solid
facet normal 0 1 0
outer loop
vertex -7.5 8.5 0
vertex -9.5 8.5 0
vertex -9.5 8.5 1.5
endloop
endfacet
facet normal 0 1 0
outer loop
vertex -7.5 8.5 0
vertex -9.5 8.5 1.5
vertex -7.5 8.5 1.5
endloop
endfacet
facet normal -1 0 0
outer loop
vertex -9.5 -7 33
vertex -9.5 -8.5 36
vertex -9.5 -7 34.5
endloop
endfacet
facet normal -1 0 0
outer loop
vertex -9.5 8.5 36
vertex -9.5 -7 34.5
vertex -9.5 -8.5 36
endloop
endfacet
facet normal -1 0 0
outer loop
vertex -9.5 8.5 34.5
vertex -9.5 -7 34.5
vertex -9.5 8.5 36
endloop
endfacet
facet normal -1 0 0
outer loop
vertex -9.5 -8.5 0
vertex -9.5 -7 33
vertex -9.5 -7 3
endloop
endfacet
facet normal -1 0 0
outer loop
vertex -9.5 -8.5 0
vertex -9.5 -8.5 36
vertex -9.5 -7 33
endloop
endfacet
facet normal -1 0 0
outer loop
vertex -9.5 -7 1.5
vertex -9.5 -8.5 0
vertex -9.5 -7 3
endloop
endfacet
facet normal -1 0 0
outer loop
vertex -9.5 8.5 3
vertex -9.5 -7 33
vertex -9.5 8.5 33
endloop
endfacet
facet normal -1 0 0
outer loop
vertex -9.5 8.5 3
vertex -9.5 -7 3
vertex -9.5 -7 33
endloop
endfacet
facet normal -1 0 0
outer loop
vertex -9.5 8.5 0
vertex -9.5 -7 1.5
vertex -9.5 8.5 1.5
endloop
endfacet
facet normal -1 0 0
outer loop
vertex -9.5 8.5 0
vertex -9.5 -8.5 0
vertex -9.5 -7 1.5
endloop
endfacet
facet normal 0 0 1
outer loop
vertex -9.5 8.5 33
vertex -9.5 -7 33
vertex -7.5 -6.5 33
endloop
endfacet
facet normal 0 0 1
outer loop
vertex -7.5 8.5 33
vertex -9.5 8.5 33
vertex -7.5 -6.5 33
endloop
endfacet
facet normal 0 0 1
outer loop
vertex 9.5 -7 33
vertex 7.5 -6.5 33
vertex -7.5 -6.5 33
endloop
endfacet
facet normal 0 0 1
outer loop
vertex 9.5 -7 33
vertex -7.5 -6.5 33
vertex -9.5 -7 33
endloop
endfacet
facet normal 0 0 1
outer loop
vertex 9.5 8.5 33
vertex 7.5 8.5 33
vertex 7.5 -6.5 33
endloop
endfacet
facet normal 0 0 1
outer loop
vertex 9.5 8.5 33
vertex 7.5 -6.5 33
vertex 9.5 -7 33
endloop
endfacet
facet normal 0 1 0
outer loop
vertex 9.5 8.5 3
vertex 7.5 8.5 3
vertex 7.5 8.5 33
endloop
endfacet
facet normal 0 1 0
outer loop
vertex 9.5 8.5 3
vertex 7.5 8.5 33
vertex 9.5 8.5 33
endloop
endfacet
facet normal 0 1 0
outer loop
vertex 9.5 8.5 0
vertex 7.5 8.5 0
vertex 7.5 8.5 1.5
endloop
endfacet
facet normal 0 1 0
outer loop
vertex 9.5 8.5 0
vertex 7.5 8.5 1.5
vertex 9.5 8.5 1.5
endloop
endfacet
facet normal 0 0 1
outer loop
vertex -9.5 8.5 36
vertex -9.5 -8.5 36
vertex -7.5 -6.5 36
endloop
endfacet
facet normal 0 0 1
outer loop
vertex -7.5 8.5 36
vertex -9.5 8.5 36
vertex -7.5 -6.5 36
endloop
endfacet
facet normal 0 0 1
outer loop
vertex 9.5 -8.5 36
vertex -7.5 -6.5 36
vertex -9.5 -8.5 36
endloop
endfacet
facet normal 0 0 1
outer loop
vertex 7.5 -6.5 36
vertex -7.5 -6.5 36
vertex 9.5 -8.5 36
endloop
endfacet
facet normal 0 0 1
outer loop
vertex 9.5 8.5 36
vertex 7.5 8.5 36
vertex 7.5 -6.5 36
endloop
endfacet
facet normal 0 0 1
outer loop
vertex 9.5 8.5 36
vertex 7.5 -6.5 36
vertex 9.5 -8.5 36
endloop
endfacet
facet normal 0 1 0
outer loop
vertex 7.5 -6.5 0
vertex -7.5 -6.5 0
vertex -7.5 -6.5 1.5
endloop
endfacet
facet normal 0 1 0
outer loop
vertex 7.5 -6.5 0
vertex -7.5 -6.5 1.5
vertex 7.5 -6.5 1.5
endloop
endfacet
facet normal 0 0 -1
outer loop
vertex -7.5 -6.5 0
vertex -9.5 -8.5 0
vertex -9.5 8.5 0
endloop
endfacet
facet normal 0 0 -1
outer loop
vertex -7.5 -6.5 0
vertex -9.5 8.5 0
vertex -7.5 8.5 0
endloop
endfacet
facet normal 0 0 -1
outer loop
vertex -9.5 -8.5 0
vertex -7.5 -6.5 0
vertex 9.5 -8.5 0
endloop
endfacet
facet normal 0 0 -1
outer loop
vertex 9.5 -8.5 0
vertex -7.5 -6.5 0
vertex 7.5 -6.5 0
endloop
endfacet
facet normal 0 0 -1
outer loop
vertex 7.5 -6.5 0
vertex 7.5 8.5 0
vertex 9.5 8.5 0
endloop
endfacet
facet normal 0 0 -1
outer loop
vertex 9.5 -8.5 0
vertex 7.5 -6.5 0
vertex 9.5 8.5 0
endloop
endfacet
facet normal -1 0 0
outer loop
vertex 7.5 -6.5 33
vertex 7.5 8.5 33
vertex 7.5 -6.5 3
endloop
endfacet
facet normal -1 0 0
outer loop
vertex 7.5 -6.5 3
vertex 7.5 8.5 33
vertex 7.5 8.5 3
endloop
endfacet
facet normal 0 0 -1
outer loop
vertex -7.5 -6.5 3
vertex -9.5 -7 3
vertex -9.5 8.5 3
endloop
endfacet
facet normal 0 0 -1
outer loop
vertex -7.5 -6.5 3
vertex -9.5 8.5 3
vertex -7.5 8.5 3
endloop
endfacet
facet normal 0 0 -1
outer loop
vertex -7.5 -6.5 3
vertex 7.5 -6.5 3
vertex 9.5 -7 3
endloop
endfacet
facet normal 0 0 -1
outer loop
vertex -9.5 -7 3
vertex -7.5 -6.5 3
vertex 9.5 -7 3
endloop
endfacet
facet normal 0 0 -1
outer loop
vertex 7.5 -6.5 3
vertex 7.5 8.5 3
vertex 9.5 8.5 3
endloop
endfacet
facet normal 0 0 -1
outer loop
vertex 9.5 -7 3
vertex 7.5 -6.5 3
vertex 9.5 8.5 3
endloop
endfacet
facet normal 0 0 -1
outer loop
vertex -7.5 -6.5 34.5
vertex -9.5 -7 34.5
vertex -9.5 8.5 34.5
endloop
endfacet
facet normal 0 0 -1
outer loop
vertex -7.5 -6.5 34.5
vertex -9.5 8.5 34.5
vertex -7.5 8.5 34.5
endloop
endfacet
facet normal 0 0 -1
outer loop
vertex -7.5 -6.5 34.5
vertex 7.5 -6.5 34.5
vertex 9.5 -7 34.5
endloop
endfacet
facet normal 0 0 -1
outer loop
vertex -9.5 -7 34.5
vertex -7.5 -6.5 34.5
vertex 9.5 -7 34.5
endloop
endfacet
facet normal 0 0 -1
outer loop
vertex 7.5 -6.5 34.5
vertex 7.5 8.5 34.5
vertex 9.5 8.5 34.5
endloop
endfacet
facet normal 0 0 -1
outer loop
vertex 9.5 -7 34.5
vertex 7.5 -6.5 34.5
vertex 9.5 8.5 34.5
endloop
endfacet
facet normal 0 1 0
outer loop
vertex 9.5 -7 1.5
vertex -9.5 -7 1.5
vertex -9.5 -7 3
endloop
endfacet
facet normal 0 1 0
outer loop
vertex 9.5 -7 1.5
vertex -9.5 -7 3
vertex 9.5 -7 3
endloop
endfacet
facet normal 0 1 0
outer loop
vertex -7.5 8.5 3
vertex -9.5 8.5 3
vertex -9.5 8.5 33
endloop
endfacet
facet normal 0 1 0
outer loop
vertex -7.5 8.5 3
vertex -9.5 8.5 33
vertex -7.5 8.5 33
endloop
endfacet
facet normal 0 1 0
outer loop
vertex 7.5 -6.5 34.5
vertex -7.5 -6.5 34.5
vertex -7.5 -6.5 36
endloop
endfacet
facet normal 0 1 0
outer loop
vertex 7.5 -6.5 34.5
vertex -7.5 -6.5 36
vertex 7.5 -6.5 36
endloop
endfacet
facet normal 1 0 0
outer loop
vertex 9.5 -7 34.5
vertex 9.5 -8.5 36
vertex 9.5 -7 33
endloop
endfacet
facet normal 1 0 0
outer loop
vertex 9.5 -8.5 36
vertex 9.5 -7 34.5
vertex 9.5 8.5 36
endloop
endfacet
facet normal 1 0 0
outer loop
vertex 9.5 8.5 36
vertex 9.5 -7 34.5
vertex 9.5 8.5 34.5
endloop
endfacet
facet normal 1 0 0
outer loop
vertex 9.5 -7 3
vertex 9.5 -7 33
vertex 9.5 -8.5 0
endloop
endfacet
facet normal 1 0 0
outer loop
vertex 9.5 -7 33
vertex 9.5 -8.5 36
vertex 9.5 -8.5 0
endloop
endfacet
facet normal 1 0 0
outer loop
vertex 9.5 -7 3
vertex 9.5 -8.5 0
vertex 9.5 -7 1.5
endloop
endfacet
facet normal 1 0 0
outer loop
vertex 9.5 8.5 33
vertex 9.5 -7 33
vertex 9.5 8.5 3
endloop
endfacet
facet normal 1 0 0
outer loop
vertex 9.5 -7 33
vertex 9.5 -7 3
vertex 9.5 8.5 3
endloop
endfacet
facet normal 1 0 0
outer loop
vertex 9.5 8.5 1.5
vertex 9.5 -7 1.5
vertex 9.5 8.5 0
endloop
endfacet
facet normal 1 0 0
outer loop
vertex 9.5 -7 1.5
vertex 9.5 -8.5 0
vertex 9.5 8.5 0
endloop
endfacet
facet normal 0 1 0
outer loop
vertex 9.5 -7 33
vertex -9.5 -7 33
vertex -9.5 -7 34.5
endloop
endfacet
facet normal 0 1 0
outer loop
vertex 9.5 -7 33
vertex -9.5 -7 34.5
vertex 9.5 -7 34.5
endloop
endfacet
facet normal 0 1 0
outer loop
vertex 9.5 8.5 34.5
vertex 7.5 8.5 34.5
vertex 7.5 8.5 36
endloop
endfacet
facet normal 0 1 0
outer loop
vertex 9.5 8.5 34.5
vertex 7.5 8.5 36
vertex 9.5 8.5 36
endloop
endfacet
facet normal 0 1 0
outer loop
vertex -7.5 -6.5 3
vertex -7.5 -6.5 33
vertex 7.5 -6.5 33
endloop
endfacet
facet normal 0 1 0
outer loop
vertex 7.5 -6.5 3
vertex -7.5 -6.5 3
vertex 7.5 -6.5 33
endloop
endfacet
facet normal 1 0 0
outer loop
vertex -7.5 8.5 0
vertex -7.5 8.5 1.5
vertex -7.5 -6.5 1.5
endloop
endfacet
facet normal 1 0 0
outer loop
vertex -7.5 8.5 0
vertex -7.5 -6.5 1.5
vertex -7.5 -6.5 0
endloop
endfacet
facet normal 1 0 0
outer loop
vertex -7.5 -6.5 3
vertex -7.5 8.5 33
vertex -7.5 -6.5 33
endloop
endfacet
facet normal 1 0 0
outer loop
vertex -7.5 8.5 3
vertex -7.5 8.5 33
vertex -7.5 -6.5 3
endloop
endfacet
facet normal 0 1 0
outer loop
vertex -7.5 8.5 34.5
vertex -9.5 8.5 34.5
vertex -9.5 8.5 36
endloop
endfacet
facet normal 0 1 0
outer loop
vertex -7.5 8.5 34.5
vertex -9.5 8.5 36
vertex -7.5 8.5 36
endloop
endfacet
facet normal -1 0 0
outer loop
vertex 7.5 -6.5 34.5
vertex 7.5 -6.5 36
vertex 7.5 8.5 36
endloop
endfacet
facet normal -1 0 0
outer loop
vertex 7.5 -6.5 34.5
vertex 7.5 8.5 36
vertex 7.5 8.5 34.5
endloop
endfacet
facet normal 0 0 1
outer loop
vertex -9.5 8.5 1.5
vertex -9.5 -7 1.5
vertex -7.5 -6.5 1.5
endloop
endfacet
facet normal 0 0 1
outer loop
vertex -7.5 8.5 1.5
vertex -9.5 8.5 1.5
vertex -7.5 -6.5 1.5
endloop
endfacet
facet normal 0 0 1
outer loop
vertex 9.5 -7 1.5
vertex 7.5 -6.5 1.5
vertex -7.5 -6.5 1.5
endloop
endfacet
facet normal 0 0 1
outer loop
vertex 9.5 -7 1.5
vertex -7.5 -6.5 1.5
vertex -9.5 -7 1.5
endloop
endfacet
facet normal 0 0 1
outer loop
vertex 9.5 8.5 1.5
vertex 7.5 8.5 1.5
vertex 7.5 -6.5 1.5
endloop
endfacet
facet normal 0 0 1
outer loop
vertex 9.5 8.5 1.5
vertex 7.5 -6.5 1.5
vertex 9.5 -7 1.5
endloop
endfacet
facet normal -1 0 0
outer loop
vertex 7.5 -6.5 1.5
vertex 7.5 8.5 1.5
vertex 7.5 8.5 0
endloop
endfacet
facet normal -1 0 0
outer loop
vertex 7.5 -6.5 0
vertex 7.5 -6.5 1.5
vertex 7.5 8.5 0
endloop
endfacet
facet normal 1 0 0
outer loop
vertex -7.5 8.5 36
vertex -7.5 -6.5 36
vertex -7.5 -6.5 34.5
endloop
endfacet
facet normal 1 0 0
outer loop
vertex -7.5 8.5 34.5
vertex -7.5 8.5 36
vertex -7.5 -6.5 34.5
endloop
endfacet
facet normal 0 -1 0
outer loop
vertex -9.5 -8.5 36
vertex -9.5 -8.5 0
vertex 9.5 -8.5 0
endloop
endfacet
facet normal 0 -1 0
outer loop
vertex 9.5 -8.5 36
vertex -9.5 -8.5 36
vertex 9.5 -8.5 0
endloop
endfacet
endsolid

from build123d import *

# Parameters (mm, degrees)
SKETCH1_W           = 19
SKETCH1_H           = 17
BOSS_EXTRUDE1_DEPTH = 36
SKETCH2_W           = 15
SKETCH2_H           = 36
CUT_EXTRUDE1_DEPTH  = 15
SKETCH3_W           = 19
SKETCH3_H           = 1.5
CUT_EXTRUDE2_DEPTH  = 15.5


with BuildPart() as part:
    # Sketch1 → Boss-Extrude1 (new body)
    with BuildSketch(Plane.XY):
        Rectangle(SKETCH1_W, SKETCH1_H)
    extrude(amount=BOSS_EXTRUDE1_DEPTH)

    # Sketch2 → Cut-Extrude1 (cut)
    with BuildSketch(Plane(origin=(0, 8.5, 0), x_dir=(1, 0, 0), z_dir=(0, 1, 0))):
        with Locations((0, -18)):
            Rectangle(SKETCH2_W, SKETCH2_H)
    extrude(amount=-CUT_EXTRUDE1_DEPTH, mode=Mode.SUBTRACT)

    # Sketch3 → Cut-Extrude2 (cut)
    with BuildSketch(Plane(origin=(0, 8.5, 0), x_dir=(1, 0, 0), z_dir=(0, 1, 0))):
        with Locations((0, -33.75)):
            Rectangle(SKETCH3_W, SKETCH3_H)
        with Locations((0, -2.25)):
            Rectangle(SKETCH3_W, SKETCH3_H)
    extrude(amount=-CUT_EXTRUDE2_DEPTH, mode=Mode.SUBTRACT)


solid = part.part
